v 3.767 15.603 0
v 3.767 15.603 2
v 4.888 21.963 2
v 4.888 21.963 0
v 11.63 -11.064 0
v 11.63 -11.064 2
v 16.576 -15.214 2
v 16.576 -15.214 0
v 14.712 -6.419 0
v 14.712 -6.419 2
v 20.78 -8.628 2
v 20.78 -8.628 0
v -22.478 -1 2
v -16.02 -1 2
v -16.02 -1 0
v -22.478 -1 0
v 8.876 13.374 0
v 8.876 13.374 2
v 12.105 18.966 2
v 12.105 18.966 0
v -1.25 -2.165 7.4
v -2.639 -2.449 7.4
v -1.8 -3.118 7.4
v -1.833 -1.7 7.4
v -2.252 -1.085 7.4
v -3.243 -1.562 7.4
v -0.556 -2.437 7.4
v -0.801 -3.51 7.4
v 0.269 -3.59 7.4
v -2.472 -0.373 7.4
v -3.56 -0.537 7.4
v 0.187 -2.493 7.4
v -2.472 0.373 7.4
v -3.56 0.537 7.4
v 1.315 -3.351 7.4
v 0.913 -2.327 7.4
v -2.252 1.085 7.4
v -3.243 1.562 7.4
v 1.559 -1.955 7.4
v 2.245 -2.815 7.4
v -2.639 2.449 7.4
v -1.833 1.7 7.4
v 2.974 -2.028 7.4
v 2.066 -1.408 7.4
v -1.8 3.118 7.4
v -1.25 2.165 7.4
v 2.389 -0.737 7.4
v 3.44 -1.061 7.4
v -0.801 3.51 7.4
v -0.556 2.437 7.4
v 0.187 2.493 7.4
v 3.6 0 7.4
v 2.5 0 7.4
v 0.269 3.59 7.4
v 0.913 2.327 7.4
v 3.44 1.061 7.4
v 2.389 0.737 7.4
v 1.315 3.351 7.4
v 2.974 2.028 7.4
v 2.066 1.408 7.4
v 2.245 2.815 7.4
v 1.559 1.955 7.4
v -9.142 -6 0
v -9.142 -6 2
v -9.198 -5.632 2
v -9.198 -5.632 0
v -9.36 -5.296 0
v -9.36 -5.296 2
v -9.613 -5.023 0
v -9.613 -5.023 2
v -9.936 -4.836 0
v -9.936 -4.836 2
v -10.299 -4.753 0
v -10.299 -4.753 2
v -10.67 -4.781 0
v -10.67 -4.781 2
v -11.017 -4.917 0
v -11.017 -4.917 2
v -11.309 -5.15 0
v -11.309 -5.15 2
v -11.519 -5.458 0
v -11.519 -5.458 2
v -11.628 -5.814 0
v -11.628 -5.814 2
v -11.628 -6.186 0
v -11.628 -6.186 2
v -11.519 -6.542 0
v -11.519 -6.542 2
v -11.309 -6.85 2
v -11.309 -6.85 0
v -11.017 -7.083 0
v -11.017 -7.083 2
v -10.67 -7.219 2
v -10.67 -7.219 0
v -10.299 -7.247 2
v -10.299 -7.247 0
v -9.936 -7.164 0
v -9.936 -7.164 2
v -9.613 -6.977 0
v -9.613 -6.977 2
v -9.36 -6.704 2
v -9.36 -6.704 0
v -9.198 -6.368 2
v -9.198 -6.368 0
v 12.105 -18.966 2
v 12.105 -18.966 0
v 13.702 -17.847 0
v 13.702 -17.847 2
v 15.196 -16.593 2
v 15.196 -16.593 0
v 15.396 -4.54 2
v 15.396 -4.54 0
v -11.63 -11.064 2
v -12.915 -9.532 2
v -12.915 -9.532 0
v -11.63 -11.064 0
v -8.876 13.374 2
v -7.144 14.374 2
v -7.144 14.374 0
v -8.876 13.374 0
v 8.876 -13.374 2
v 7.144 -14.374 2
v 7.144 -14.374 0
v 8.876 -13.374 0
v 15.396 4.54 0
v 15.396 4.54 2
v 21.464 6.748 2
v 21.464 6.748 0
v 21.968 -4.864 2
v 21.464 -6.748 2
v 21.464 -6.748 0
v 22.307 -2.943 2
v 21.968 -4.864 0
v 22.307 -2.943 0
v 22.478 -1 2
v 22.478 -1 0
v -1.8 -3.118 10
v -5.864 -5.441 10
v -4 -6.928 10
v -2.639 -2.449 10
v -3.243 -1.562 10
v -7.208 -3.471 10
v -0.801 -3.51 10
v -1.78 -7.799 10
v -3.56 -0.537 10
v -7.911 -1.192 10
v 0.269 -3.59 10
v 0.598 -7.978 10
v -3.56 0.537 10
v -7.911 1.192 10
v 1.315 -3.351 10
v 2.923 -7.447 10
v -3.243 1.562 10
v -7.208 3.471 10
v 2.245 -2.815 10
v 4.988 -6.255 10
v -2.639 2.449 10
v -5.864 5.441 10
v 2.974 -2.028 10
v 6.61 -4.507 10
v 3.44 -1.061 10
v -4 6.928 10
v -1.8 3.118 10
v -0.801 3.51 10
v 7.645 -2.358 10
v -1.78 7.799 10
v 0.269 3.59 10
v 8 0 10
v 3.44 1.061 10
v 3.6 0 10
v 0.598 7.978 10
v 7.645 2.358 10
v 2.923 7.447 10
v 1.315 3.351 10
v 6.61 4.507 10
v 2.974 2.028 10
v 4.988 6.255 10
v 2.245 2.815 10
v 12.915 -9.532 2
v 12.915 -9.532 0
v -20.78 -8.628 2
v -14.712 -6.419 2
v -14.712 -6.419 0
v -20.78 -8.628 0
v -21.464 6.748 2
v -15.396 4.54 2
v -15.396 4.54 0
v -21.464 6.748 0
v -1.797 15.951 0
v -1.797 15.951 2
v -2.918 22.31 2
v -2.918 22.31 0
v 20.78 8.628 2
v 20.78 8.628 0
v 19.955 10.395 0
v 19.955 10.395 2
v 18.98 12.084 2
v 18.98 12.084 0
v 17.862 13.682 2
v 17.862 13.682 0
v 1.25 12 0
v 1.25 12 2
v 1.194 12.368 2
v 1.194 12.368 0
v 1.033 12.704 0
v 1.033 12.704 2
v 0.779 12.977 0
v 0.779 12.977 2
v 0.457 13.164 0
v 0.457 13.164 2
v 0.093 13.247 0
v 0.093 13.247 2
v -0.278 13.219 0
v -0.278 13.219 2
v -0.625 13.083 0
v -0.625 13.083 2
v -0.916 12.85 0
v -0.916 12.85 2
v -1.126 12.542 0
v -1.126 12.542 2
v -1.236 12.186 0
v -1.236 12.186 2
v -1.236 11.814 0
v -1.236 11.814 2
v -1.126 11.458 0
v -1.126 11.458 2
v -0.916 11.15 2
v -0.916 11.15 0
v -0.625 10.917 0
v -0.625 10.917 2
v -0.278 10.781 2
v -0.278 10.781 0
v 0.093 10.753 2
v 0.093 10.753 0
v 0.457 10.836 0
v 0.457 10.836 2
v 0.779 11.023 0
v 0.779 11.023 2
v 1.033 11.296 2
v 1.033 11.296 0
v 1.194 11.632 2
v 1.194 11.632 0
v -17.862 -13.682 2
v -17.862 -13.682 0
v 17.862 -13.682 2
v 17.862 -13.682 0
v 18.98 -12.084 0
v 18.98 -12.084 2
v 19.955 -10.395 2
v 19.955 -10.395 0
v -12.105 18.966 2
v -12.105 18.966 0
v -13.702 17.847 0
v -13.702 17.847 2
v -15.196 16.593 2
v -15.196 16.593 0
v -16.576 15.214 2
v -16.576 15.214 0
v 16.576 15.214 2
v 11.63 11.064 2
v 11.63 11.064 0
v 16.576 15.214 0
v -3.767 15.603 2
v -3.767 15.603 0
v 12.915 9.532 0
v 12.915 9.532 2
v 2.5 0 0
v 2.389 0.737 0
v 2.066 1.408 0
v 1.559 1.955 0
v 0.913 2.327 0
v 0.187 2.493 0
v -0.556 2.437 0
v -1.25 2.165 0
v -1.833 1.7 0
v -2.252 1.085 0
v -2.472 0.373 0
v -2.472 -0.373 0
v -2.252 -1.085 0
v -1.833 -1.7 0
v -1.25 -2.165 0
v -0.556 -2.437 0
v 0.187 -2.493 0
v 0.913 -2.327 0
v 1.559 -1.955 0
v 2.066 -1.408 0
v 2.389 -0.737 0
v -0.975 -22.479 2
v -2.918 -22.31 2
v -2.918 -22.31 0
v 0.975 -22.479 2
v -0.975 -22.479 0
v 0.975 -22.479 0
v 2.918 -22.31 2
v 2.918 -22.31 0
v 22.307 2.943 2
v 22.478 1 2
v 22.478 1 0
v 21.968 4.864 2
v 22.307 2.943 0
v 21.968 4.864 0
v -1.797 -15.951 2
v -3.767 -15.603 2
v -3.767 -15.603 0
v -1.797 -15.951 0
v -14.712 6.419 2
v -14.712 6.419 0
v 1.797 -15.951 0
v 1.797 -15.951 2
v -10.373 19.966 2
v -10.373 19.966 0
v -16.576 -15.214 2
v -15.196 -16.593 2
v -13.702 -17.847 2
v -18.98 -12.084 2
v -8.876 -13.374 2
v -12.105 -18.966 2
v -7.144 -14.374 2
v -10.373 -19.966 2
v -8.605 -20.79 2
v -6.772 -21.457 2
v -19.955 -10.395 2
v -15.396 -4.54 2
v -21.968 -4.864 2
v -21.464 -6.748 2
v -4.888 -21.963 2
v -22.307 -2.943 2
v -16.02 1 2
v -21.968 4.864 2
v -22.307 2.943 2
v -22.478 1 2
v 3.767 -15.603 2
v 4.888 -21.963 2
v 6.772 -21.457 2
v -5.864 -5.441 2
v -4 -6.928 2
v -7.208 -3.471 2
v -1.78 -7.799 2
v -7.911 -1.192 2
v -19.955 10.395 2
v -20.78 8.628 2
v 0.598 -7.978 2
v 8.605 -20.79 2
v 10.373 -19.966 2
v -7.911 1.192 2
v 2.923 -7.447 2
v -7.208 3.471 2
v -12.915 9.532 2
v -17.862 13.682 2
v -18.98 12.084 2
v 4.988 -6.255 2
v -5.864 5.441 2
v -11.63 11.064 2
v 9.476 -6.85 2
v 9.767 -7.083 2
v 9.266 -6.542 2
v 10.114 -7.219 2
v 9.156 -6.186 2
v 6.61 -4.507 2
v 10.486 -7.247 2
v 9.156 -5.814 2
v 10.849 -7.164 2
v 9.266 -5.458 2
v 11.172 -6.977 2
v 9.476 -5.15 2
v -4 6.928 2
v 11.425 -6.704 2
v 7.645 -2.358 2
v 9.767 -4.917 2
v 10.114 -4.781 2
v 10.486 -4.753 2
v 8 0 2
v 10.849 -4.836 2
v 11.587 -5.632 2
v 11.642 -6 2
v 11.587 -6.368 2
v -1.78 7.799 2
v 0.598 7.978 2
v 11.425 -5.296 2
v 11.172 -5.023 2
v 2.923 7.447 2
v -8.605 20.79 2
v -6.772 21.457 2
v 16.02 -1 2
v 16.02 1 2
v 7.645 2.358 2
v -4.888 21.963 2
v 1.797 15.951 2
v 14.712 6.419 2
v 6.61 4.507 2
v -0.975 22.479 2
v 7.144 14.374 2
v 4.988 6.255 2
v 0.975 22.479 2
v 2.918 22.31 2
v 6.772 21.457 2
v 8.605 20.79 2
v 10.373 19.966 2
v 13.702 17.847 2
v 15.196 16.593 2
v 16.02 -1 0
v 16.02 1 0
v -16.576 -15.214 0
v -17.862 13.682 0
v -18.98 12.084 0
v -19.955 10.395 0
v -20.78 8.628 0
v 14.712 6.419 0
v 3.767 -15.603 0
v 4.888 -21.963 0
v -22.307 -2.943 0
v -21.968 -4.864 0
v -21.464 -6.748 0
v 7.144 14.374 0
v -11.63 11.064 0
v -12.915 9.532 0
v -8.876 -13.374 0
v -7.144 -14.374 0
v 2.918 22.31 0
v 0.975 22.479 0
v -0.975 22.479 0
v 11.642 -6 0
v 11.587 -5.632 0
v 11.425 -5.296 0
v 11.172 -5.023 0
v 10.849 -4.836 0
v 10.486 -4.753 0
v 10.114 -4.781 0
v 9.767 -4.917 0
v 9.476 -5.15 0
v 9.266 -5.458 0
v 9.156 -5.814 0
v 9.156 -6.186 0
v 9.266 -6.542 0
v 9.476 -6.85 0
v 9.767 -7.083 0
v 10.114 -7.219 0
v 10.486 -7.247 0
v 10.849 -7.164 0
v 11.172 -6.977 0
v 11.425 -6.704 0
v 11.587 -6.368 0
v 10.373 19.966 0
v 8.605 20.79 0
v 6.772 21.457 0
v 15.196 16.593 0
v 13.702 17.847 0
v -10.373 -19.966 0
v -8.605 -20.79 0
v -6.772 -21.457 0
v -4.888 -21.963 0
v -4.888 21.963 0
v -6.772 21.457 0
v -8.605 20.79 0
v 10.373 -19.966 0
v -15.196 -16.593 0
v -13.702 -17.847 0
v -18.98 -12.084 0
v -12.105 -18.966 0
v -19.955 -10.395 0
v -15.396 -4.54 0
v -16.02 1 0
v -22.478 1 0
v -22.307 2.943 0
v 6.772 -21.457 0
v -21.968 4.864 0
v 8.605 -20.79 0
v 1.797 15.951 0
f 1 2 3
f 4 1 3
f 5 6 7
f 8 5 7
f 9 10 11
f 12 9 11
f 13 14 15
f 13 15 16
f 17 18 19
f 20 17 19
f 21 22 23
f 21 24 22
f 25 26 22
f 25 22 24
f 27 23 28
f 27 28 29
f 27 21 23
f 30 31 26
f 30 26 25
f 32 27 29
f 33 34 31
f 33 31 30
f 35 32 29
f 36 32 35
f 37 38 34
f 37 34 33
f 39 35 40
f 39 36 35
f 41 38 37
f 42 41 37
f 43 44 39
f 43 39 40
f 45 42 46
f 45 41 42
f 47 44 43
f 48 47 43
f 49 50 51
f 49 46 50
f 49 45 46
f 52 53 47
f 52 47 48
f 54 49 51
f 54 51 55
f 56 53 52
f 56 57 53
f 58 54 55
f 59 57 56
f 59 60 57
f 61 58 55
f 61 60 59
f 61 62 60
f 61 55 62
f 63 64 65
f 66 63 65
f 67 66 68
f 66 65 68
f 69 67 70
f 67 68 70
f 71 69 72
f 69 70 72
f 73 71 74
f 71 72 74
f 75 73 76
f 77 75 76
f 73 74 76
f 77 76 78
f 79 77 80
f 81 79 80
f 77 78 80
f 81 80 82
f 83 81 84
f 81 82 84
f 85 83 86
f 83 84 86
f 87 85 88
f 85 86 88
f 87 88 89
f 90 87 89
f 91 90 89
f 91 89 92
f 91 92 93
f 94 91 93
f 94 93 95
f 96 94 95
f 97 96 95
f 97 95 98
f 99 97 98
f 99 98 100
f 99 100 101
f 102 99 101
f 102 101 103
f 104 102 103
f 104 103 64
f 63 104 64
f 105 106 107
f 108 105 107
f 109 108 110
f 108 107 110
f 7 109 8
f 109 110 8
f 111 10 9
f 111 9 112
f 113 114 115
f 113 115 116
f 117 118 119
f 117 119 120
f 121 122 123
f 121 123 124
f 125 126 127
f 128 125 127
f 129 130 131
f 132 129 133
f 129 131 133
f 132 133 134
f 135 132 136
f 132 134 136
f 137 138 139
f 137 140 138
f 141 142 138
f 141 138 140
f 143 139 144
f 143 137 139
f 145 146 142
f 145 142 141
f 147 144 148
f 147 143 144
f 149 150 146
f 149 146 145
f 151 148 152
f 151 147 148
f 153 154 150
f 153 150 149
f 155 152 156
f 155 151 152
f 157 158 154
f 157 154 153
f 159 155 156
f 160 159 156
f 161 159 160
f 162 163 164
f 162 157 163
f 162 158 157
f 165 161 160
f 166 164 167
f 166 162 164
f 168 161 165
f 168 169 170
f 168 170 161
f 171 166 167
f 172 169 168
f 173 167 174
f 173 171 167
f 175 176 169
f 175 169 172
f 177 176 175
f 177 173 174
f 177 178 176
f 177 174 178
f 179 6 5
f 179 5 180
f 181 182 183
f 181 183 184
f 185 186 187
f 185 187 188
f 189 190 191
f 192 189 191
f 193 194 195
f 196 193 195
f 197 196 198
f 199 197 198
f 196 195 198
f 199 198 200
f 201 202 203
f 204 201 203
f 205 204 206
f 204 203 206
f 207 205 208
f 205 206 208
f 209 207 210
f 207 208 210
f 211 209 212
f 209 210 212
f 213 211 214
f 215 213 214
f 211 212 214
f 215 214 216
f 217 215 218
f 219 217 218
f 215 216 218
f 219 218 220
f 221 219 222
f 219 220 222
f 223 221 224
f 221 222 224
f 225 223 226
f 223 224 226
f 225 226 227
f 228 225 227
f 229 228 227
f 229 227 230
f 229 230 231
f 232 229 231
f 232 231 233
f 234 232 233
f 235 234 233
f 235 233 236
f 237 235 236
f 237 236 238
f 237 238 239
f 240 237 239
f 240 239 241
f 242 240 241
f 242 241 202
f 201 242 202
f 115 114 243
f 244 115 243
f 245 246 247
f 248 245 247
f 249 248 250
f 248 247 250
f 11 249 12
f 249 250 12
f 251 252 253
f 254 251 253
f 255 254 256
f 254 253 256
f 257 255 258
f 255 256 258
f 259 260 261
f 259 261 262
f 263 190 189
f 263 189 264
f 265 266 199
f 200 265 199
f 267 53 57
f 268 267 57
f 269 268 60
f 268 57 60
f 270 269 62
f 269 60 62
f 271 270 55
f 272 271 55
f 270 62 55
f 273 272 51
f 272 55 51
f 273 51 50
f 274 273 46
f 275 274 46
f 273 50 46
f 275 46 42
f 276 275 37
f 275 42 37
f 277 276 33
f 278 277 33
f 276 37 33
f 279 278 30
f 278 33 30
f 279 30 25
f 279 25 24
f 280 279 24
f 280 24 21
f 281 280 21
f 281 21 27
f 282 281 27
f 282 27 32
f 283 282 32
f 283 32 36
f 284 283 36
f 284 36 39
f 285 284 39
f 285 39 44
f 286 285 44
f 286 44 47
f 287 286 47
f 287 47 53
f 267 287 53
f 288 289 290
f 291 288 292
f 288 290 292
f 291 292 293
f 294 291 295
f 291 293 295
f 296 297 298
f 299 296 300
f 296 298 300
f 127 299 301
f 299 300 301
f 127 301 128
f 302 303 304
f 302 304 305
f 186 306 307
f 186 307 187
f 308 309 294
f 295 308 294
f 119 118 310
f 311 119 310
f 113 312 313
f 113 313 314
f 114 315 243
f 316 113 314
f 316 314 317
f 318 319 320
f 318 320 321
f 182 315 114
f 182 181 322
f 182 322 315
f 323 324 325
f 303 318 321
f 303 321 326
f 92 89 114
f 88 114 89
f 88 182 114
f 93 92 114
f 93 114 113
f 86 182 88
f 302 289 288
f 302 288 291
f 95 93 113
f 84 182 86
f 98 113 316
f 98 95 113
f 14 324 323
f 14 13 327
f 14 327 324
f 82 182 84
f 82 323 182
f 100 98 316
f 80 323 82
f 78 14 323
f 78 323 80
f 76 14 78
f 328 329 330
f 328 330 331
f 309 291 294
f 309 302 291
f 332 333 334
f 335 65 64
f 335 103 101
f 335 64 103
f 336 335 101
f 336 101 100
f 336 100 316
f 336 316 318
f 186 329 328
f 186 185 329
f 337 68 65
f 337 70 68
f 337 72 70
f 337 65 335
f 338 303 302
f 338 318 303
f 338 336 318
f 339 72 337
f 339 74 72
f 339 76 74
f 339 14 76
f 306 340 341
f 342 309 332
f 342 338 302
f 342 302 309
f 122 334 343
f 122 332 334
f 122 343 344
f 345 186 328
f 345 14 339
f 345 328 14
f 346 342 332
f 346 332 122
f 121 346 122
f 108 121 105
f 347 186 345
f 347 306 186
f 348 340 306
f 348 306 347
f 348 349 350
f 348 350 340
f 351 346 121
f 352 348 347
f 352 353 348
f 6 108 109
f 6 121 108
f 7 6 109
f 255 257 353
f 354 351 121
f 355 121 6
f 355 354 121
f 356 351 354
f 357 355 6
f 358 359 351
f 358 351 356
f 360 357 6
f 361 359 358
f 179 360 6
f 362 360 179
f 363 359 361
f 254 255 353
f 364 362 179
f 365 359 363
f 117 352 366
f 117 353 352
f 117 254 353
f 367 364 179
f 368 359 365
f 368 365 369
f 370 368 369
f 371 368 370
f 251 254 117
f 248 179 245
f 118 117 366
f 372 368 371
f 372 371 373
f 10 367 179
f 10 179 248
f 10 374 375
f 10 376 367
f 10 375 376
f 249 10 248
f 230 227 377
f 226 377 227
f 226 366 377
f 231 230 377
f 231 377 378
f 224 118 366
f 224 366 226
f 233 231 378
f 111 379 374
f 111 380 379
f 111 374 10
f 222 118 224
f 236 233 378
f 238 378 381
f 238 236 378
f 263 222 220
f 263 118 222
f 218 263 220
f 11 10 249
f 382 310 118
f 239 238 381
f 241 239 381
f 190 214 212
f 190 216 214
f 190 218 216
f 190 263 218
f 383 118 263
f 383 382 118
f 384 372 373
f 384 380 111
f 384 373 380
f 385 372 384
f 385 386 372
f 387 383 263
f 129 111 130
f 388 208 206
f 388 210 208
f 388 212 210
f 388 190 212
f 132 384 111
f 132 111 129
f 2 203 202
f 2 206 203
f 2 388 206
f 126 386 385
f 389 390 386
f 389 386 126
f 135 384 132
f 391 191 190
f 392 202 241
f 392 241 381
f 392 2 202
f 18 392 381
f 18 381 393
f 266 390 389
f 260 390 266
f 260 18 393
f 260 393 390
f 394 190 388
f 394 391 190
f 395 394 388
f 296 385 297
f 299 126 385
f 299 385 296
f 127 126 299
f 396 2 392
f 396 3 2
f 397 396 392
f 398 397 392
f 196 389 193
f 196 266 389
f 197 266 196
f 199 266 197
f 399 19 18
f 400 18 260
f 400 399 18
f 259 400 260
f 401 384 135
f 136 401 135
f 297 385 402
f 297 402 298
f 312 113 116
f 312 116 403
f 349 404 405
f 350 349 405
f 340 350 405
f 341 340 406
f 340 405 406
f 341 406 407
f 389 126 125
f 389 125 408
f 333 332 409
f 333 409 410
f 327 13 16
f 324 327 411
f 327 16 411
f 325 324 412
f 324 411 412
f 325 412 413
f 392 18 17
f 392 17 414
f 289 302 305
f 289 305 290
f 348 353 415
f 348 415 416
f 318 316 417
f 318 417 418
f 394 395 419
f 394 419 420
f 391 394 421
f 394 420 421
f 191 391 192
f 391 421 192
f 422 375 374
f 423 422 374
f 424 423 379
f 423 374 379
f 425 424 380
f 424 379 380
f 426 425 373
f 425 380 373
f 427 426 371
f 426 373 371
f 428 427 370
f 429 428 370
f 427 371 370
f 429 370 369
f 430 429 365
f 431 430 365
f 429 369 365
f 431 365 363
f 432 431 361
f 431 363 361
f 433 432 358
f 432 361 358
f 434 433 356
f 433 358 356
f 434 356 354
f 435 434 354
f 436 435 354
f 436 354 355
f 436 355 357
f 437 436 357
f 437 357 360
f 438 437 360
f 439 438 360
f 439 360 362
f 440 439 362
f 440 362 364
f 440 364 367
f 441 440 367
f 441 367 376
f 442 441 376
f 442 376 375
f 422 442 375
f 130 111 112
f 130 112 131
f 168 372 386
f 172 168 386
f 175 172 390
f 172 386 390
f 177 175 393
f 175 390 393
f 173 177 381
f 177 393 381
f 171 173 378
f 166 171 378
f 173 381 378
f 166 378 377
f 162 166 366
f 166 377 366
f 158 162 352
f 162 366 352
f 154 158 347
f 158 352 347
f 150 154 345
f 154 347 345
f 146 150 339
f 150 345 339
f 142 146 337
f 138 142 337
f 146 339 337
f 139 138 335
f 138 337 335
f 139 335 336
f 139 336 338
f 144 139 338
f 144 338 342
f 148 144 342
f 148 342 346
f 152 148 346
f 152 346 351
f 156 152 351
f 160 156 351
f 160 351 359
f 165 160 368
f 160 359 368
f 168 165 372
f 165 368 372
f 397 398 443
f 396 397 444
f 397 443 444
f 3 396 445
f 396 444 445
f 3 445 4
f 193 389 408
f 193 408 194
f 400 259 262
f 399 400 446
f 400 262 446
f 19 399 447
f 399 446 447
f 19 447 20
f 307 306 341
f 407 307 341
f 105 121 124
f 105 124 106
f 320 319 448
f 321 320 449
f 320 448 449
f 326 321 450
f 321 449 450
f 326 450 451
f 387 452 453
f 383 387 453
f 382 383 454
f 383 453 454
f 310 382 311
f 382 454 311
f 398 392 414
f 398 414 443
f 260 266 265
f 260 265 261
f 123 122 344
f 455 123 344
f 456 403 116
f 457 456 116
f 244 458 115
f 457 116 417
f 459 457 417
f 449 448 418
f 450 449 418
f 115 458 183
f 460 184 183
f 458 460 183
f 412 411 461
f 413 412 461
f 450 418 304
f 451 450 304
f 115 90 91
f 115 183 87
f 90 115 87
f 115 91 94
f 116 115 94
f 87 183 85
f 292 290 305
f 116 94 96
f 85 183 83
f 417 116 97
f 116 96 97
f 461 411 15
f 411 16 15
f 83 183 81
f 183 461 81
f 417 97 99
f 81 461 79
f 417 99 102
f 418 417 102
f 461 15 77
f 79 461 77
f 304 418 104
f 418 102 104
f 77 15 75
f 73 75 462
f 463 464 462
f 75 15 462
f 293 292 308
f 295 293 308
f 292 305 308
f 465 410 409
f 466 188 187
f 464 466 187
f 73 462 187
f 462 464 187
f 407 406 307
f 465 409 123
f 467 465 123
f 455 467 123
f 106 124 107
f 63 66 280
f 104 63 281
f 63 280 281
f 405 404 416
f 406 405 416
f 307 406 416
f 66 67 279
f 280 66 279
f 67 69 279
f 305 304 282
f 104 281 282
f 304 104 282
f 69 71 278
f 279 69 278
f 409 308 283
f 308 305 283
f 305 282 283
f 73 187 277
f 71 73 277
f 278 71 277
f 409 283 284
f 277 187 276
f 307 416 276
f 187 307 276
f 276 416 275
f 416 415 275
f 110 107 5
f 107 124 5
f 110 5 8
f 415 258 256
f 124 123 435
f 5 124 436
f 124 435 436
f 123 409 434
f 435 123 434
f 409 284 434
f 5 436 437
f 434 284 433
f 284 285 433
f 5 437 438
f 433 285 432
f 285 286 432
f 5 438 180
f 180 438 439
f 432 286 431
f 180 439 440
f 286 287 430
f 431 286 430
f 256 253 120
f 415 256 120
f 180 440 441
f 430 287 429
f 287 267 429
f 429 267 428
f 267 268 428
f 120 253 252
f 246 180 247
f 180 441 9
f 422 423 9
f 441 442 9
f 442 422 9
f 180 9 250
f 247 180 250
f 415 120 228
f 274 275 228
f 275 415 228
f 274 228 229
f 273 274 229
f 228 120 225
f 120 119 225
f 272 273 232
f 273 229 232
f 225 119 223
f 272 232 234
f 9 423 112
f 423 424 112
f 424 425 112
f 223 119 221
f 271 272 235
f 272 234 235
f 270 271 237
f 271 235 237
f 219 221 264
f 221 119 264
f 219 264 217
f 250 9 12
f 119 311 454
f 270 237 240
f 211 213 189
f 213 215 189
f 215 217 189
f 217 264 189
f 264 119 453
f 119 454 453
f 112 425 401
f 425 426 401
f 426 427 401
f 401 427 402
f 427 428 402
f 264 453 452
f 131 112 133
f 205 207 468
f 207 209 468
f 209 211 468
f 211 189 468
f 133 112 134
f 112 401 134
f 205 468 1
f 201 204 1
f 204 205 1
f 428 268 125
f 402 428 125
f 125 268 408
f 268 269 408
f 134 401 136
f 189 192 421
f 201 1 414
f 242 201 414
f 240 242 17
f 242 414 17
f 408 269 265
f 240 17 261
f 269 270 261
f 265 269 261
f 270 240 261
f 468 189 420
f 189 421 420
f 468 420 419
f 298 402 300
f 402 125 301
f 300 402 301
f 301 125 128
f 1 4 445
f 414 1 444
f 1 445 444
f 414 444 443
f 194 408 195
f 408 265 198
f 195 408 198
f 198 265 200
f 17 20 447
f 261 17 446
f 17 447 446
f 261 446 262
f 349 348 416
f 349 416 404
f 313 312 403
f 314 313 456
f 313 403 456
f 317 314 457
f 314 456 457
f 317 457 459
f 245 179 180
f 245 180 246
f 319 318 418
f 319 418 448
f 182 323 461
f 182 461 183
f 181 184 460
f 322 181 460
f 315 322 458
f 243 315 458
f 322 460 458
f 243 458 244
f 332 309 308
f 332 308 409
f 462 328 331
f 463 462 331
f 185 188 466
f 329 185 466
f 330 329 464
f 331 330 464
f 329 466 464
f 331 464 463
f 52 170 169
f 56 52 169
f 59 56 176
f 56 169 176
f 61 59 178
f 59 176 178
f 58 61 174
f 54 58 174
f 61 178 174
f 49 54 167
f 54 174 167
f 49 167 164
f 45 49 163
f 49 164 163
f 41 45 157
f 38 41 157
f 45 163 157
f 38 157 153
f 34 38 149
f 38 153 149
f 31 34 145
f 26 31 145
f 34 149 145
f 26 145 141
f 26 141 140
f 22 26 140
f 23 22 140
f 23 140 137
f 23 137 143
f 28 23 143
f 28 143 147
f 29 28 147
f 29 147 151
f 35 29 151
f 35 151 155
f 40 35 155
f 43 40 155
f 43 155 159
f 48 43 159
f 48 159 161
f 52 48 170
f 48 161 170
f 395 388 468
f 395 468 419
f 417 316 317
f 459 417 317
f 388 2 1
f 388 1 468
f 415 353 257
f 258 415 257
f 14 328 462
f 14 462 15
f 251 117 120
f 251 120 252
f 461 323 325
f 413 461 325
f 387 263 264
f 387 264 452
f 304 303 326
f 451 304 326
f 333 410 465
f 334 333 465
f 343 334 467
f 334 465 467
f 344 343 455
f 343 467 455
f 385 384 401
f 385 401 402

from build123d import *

# Parameters (mm, degrees)
SKETCH1_R           = 22.5
BOSS_EXTRUDE1_DEPTH = 2
SKETCH2_R           = 8
BOSS_EXTRUDE2_DEPTH = 8
SKETCH3_R           = 2.5
CUT_EXTRUDE1_DEPTH  = 34.35416016
SKETCH4_R           = 3.6
CUT_EXTRUDE2_DEPTH  = 2.6
SKETCH5_R           = 1.25
CUT_EXTRUDE3_DEPTH  = 33.810059433
SKETCH7_W           = 7.216965313
SKETCH7_H           = 2
CUT_EXTRUDE4_DEPTH  = 10
CIRPATTERN1_COUNT   = 18


with BuildPart() as part:
    # Sketch1 → Boss-Extrude1 (new body)
    with BuildSketch(Plane.XY):
        Circle(SKETCH1_R)
    extrude(amount=BOSS_EXTRUDE1_DEPTH)

    # Sketch2 → Boss-Extrude2 (add)
    with BuildSketch(Plane.XY.offset(2)):
        Circle(SKETCH2_R)
    extrude(amount=BOSS_EXTRUDE2_DEPTH)

    # Sketch3 → Cut-Extrude1 (cut, through all)
    with BuildSketch(Plane.XY.offset(10)):
        Circle(SKETCH3_R)
    extrude(amount=-CUT_EXTRUDE1_DEPTH, mode=Mode.SUBTRACT)

    # Sketch4 → Cut-Extrude2 (cut)
    with BuildSketch(Plane.XY.offset(10)):
        Circle(SKETCH4_R)
    extrude(amount=-CUT_EXTRUDE2_DEPTH, mode=Mode.SUBTRACT)

    # Sketch5 → Cut-Extrude3 (cut, through all)
    with BuildSketch(Plane.XY.offset(2)):
        with Locations((0, 12)):
            Circle(SKETCH5_R)
        with Locations((-10.392304845, -6)):
            Circle(SKETCH5_R)
        with Locations((10.392304845, -6)):
            Circle(SKETCH5_R)
    extrude(amount=-CUT_EXTRUDE3_DEPTH, mode=Mode.SUBTRACT)

    # Sketch7 → Cut-Extrude4 (cut)
    with BuildSketch(Plane.XY.offset(2)):
        with Locations((19.628882318, 0)):
            Rectangle(SKETCH7_W, SKETCH7_H)
    cut_extrude4 = extrude(amount=-CUT_EXTRUDE4_DEPTH, mode=Mode.SUBTRACT)

    # CirPattern1: Cut-Extrude4 ×18 about axis
    cirpattern1_axis = Axis((0, 0, 0), (0, 0, 1))
    for i in range(1, CIRPATTERN1_COUNT):
        add(cut_extrude4.rotate(cirpattern1_axis, i * 360 / CIRPATTERN1_COUNT), mode=Mode.SUBTRACT)


solid = part.part
